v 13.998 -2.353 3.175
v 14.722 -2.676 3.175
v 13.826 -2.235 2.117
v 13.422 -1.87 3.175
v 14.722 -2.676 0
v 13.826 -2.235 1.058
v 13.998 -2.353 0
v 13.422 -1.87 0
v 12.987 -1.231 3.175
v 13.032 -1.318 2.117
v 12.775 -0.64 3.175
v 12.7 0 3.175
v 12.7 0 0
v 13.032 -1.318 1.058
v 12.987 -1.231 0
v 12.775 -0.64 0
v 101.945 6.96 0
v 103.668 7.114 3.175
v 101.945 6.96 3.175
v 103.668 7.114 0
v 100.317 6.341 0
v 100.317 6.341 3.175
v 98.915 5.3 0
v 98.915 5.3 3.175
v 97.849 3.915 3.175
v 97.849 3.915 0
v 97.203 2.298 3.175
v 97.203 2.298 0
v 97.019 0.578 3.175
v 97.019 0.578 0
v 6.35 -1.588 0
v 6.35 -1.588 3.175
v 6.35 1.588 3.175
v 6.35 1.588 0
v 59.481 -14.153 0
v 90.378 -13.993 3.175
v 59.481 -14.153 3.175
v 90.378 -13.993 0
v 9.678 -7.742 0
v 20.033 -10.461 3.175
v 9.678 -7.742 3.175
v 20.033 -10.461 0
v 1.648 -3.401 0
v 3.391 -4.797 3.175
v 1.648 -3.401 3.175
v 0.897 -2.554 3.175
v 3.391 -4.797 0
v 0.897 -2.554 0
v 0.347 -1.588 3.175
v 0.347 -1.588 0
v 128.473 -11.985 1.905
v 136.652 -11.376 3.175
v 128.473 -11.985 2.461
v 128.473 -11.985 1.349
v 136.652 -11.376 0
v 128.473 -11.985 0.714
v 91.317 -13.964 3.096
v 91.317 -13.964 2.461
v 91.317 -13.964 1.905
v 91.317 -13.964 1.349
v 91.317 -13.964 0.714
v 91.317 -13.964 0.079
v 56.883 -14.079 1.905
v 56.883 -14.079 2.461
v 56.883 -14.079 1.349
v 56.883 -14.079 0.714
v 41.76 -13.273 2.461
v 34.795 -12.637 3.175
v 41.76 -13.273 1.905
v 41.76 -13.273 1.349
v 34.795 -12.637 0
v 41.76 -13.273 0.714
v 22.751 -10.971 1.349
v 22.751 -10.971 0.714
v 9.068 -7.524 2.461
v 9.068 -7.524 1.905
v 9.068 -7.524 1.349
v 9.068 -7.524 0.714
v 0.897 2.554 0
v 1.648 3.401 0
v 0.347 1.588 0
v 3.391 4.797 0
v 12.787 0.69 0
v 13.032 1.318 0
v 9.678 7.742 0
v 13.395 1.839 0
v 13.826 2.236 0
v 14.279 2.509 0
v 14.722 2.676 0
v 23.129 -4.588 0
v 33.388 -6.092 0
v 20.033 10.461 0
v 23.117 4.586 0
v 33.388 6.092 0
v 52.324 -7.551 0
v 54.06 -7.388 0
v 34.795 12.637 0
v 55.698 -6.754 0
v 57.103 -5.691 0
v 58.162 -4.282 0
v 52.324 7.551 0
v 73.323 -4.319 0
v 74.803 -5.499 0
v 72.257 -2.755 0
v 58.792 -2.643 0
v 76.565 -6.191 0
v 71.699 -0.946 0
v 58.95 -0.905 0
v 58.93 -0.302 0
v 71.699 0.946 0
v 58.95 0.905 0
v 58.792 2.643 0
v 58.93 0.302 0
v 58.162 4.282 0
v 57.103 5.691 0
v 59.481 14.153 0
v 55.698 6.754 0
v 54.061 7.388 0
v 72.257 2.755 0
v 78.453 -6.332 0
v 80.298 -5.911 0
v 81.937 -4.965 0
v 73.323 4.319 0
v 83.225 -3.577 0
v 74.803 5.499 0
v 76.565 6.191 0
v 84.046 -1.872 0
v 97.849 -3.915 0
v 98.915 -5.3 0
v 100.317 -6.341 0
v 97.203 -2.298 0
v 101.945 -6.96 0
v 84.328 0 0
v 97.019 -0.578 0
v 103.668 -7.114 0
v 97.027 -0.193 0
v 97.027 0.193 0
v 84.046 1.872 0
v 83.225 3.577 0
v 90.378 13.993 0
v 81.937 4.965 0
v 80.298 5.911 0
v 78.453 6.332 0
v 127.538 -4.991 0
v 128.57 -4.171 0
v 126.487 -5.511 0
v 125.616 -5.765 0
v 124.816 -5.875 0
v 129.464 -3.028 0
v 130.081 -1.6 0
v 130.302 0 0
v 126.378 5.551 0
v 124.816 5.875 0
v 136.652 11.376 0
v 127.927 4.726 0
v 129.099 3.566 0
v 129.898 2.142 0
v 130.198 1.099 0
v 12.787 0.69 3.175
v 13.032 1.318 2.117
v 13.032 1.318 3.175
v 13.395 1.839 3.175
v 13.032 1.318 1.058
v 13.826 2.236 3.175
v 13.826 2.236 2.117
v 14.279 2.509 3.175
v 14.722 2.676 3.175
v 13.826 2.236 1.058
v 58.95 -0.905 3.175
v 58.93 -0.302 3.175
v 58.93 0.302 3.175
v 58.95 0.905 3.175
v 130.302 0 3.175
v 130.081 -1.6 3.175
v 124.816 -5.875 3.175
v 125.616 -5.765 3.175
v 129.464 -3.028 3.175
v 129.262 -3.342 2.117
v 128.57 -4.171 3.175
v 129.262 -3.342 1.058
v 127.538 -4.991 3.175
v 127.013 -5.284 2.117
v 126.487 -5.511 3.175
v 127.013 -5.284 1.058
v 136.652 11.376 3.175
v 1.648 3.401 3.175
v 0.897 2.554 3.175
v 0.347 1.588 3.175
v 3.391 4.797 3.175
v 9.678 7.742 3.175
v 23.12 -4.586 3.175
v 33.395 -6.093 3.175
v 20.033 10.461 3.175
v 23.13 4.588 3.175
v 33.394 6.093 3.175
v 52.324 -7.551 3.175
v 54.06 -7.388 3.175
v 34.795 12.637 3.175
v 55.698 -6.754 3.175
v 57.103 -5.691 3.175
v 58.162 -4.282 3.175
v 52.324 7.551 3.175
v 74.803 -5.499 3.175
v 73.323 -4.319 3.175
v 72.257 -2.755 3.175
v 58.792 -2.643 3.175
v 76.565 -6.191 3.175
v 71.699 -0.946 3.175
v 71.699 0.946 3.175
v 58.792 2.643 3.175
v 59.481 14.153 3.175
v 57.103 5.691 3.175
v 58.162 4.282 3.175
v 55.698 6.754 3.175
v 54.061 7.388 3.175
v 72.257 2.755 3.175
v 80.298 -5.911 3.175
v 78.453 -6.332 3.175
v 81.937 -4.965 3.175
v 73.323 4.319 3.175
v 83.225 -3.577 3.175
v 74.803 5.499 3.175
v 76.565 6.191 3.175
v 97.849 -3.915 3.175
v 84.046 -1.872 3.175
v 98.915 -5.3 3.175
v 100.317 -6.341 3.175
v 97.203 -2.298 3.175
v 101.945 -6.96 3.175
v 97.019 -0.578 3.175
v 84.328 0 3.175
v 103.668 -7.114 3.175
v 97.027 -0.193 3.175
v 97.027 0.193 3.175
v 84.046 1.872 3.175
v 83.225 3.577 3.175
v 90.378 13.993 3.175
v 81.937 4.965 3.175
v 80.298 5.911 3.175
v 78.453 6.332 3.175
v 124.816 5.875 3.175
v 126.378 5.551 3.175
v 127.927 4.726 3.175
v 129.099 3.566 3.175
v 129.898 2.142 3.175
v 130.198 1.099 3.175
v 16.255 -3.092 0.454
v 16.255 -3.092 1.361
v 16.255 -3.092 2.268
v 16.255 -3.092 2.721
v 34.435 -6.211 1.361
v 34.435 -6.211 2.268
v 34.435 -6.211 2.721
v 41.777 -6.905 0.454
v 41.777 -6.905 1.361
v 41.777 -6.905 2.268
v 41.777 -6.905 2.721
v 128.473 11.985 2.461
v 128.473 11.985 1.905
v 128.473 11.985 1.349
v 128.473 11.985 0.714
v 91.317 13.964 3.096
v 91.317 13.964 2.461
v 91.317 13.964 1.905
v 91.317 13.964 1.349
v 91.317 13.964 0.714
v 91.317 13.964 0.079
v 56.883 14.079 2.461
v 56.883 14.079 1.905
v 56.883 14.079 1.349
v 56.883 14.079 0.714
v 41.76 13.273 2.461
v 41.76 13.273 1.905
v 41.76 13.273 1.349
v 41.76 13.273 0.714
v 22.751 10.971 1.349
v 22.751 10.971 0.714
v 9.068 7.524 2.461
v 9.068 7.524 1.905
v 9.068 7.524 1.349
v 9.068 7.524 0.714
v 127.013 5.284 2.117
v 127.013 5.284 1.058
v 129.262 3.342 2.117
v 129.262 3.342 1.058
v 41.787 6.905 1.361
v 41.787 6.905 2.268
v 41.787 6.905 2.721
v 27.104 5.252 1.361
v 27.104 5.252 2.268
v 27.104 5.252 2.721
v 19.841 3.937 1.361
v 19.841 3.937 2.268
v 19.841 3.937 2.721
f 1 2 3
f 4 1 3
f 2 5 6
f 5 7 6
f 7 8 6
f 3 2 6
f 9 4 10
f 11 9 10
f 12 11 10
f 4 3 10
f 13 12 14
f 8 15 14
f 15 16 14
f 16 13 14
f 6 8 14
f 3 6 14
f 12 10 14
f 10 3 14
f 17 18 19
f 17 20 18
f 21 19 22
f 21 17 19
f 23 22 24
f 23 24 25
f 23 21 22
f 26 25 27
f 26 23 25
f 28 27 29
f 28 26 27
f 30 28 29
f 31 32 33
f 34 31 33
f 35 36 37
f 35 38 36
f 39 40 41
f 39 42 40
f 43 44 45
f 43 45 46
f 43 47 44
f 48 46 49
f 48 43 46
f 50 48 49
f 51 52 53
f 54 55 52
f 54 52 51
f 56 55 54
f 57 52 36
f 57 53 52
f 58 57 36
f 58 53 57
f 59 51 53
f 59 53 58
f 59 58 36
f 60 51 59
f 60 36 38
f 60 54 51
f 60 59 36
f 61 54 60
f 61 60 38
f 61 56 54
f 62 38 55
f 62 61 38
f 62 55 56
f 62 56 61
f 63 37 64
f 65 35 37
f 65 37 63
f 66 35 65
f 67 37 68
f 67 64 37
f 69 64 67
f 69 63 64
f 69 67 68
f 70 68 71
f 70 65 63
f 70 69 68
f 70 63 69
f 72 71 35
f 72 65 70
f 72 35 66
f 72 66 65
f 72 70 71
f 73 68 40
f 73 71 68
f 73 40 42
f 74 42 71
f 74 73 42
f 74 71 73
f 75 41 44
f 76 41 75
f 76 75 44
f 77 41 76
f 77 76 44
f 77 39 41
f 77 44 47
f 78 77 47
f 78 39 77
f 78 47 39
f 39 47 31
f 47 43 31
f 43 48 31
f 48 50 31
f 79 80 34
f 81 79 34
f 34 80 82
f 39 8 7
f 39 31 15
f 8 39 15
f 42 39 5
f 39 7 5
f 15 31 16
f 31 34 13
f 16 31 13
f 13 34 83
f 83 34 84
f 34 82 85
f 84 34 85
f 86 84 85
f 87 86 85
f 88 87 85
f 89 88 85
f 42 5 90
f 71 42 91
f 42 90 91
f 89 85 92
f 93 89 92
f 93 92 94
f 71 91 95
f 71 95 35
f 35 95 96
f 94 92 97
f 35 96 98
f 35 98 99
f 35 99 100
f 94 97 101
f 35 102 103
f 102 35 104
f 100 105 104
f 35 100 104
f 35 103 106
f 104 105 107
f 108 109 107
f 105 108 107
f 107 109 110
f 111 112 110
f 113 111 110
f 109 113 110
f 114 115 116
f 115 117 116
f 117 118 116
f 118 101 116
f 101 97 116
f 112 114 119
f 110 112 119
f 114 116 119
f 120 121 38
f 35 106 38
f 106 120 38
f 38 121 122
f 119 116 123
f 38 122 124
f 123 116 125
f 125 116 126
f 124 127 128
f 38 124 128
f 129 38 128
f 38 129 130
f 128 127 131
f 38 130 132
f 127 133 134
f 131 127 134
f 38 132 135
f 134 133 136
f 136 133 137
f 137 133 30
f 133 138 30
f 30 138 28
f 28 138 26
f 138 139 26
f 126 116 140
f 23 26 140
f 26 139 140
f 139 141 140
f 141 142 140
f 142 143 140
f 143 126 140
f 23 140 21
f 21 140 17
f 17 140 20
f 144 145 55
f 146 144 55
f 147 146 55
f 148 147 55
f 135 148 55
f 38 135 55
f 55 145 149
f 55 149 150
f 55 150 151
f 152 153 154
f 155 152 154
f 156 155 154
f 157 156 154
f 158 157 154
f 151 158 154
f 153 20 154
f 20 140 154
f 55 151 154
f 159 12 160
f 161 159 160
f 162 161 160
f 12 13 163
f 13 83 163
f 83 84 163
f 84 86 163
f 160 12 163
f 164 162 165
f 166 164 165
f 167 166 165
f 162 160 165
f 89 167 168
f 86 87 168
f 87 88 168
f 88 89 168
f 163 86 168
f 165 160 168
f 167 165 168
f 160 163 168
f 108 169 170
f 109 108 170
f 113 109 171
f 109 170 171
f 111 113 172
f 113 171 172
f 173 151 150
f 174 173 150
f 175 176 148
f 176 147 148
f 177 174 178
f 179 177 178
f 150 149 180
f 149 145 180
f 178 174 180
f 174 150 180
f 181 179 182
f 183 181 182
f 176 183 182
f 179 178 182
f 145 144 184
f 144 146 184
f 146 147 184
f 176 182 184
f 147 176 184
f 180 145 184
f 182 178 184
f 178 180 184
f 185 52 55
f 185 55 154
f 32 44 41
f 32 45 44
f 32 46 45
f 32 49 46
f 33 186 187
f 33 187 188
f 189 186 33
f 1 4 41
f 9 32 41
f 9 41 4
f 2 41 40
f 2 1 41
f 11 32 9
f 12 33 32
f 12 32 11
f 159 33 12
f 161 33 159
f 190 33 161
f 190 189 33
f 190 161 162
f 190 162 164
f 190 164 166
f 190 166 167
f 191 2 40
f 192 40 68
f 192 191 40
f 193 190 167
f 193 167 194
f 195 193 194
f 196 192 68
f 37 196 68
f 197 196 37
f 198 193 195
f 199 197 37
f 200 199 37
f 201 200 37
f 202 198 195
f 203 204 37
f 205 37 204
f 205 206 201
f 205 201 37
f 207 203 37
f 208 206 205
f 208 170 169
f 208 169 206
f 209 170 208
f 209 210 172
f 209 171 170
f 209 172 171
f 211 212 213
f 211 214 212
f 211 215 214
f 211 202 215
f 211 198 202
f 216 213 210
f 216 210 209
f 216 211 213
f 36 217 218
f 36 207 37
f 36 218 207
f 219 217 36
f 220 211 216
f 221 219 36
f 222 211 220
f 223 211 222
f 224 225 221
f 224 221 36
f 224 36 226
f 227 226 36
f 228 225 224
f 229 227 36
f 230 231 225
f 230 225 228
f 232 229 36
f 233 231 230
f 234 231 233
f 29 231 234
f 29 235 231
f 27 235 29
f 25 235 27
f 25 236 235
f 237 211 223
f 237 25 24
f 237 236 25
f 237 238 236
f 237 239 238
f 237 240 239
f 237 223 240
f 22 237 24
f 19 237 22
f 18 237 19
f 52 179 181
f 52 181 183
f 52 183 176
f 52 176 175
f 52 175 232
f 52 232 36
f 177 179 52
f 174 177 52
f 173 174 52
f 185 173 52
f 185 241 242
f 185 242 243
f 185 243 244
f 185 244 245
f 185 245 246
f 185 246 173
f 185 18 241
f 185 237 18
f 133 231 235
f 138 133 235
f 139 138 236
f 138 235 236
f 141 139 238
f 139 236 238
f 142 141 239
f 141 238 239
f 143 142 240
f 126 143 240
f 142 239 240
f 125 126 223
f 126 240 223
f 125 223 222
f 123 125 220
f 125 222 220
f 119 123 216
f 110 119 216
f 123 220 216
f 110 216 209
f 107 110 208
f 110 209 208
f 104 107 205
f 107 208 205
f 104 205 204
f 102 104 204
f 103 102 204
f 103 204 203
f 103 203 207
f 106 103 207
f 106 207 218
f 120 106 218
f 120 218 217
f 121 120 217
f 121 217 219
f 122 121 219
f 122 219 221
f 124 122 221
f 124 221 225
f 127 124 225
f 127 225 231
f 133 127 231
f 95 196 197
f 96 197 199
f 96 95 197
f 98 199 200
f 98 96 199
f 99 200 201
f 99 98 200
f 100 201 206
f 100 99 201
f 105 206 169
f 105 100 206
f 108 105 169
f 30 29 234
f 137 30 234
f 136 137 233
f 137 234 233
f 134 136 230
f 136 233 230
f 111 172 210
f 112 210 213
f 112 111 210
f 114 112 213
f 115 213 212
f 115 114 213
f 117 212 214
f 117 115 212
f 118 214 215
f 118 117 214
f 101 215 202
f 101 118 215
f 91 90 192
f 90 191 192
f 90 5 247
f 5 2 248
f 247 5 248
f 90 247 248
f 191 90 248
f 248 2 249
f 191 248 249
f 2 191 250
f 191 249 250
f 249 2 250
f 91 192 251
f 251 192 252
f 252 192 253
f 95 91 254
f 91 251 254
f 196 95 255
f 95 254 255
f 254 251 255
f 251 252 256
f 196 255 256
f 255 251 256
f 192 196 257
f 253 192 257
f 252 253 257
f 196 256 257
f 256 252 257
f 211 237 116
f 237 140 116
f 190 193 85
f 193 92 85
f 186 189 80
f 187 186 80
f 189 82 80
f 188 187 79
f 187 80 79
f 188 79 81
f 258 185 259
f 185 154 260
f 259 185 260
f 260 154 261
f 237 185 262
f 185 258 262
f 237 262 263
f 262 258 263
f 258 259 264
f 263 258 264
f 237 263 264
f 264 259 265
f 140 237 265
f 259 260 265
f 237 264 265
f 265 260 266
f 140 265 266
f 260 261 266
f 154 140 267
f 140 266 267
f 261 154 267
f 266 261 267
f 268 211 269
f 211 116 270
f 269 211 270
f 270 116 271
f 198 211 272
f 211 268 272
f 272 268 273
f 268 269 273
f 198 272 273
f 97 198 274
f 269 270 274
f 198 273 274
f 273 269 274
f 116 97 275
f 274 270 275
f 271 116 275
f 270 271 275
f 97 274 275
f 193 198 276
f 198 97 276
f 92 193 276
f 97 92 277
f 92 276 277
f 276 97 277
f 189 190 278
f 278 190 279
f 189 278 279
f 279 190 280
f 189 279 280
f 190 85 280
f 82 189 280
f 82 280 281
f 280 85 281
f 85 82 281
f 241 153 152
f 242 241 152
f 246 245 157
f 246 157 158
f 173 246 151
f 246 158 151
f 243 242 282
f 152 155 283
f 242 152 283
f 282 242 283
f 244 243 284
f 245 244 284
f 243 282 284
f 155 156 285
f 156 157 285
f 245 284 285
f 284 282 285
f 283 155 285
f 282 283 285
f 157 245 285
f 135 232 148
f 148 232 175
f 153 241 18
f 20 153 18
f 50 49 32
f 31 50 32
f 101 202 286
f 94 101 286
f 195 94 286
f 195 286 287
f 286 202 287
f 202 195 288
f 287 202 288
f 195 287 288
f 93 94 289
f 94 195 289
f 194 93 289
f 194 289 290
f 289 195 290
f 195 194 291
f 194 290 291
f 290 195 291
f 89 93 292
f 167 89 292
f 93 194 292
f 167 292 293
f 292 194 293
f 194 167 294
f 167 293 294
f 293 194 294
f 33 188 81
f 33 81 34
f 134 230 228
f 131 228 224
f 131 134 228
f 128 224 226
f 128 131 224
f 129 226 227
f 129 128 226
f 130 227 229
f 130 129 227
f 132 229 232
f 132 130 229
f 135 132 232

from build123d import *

# Parameters (mm, degrees)
BOSS_EXTRUDE1_DEPTH = 3.175
SKETCH3_R           = 6.35
SKETCH3_W           = 101.6
SKETCH3_H           = 101.6
SKETCH3_W_2         = 6.35
SKETCH3_H_2         = 3.175
CUT_EXTRUDE1_DEPTH  = 5.08
CUT_EXTRUDE2_DEPTH  = 5.08
FILLET1_R           = 6.35
FILLET2_DEPTH       = 3.175
FILLET3_DEPTH       = 3.175


with BuildPart() as part:
    # Sketch2 → Boss-Extrude1 (new body)
    with BuildSketch(Plane.XY):
        with BuildLine():
            add(Edge.make_bspline(
                [(238.252, 0), (238.137287952, 0.133045201), (237.77207605, 0.556624867), (236.492491596, 0.433381797), (234.746176517, 0.839991501), (232.179813549, 1.11930028), (228.961819586, 1.582109184), (225.049510149, 2.090865972), (220.490135834, 2.68626254), (215.303857957, 3.3424435), (209.525250222, 4.056068786), (203.189096271, 4.814866496), (196.334767874, 5.610240284), (189.004344512, 6.431112947), (181.243085157, 7.267536628), (173.098884015, 8.109100956), (164.621936298, 8.944949754), (155.864527368, 9.763348396), (146.880589413, 10.553553512), (137.725609535, 11.302354143), (128.455841103, 11.997541105), (119.128519532, 12.626207685), (109.801114172, 13.175209012), (100.531046651, 13.630675258), (91.37556861, 13.980460991), (82.390862495, 14.213154889), (73.632451948, 14.3173913), (65.154153809, 14.284897979), (57.008238889, 14.109398576), (49.244849388, 13.786444375), (41.91176916, 13.315190578), (35.054071993, 12.697055156), (28.713707328, 11.936865774), (22.929370487, 11.041090517), (17.735955293, 10.019084993), (13.164400922, 8.882405292), (9.239142537, 7.642135457), (5.984741248, 6.30982688), (3.398200889, 4.894493254), (1.521056143, 3.393341148), (0.248902593, 1.770054281), (0.079123223, 0.562679551), (0, 0)],
                knots=[0, 0, 0, 0, 0.002091853, 0.006659889, 0.014240034, 0.024784942, 0.038226646, 0.054481348, 0.073444809, 0.094998776, 0.11900639, 0.145318898, 0.173770288, 0.204183654, 0.236370679, 0.270129473, 0.305250351, 0.341516861, 0.378701149, 0.416575318, 0.454902219, 0.493447217, 0.531971459, 0.57023708, 0.608012632, 0.645066312, 0.681178002, 0.716129843, 0.74971807, 0.781748295, 0.812036536, 0.840415327, 0.866732056, 0.890849065, 0.912651845, 0.932046273, 0.94897292, 0.963413199, 0.975421325, 0.985175212, 0.993091122, 1, 1, 1, 1], degree=3))
            add(Edge.make_bspline(
                [(238.252, 0), (238.137287952, -0.133045201), (237.77207605, -0.556624867), (236.492491596, -0.433381797), (234.746176517, -0.839991501), (232.179813549, -1.11930028), (228.961819586, -1.582109184), (225.049510149, -2.090865972), (220.490135834, -2.68626254), (215.303857957, -3.3424435), (209.525250222, -4.056068786), (203.189096271, -4.814866496), (196.334767874, -5.610240284), (189.004344512, -6.431112947), (181.243085157, -7.267536628), (173.098884015, -8.109100956), (164.621936298, -8.944949754), (155.864527368, -9.763348396), (146.880589413, -10.553553512), (137.725609535, -11.302354143), (128.455841103, -11.997541105), (119.128519532, -12.626207685), (109.801114172, -13.175209012), (100.531046651, -13.630675258), (91.37556861, -13.980460991), (82.390862495, -14.213154889), (73.632451948, -14.3173913), (65.154153809, -14.284897979), (57.008238889, -14.109398576), (49.244849388, -13.786444375), (41.91176916, -13.315190578), (35.054071993, -12.697055156), (28.713707328, -11.936865774), (22.929370487, -11.041090517), (17.735955293, -10.019084993), (13.164400922, -8.882405292), (9.239142537, -7.642135457), (5.984741248, -6.30982688), (3.398200889, -4.894493254), (1.521056143, -3.393341148), (0.248902593, -1.770054281), (0.079123223, -0.562679551), (0, 0)],
                knots=[0, 0, 0, 0, 0.002091853, 0.006659889, 0.014240034, 0.024784942, 0.038226646, 0.054481348, 0.073444809, 0.094998776, 0.11900639, 0.145318898, 0.173770288, 0.204183654, 0.236370679, 0.270129473, 0.305250351, 0.341516861, 0.378701149, 0.416575318, 0.454902219, 0.493447217, 0.531971459, 0.57023708, 0.608012632, 0.645066312, 0.681178002, 0.716129843, 0.74971807, 0.781748295, 0.812036536, 0.840415327, 0.866732056, 0.890849065, 0.912651845, 0.932046273, 0.94897292, 0.963413199, 0.975421325, 0.985175212, 0.993091122, 1, 1, 1, 1], degree=3))
        make_face()
    extrude(amount=BOSS_EXTRUDE1_DEPTH)

    # Sketch3 → Cut-Extrude1 (cut)
    with BuildSketch(Plane.XY.offset(3.175)):
        with Locations((77.978, 0)):
            Circle(SKETCH3_R)
        with Locations((187.452, 0)):
            Rectangle(SKETCH3_W, SKETCH3_H)
        with Locations((3.175, 0)):
            Rectangle(SKETCH3_W_2, SKETCH3_H_2)
    extrude(amount=-CUT_EXTRUDE1_DEPTH, mode=Mode.SUBTRACT)

    # Sketch4 → Cut-Extrude2 (cut)
    with BuildSketch(Plane.XY.offset(3.175)):
        with BuildLine():
            Line((12.7, 2.061236545), (12.7, -2.061236545))
            add(Edge.make_bspline(
                [(12.7, -2.061236545), (13.87302955, -2.443877536), (15.059598103, -2.782274606), (17.45007242, -3.402412701), (18.654719046, -3.682875551), (22.272131196, -4.457000706), (24.694910319, -4.884570871), (29.554752497, -5.626532885), (31.991957197, -5.93980242), (36.877070752, -6.481527427), (39.324986389, -6.70992917), (46.681501726, -7.293964145), (51.604643093, -7.550220084), (57.888045432, -7.759101786), (59.249411697, -7.797222339), (60.610975339, -7.828726233)],
                knots=[0, 0, 0, 0, 0.03125, 0.03125, 0.0625, 0.0625, 0.125, 0.125, 0.1875, 0.1875, 0.25, 0.25, 0.375, 0.375, 0.409562817, 0.409562817, 0.409562817, 0.409562817], degree=3))
            ThreePointArc((60.610975339, -7.828726233), (58.928, -2.977e-06), (60.610972892, 7.828720805))
            add(Edge.make_bspline(
                [(60.610972892, 7.828720805), (59.248339009, 7.797194353), (57.886109917, 7.759046352), (51.605681243, 7.550222376), (46.692451729, 7.294644767), (39.334730429, 6.710796809), (36.884205555, 6.482297599), (31.98834866, 5.939423271), (29.540067539, 5.624629017), (24.668508937, 4.880199139), (22.245087233, 4.451720456), (18.638476615, 3.679142949), (17.440989968, 3.400141258), (15.059205889, 2.782087789), (13.874610371, 2.444393198), (12.7, 2.061236545)],
                knots=[0.590397153, 0.590397153, 0.590397153, 0.590397153, 0.625, 0.625, 0.75, 0.75, 0.8125, 0.8125, 0.875, 0.875, 0.9375, 0.9375, 0.96875, 0.96875, 1, 1, 1, 1], degree=3))
        make_face()
        with BuildLine():
            Line((130.302, -5.486095107), (130.302, 5.486095107))
            add(Edge.make_bspline(
                [(130.302, 5.486095107), (120.479608061, 6.203654851), (110.65279807, 6.808891522), (99.048125108, 7.323580363), (97.276696647, 7.396621304), (95.50503071, 7.463624756)],
                knots=[0, 0, 0, 0, 0.25, 0.25, 0.295030215, 0.295030215, 0.295030215, 0.295030215], degree=3))
            ThreePointArc((95.50503071, 7.463624756), (97.028, 8e-09), (95.505030716, -7.463624741))
            add(Edge.make_bspline(
                [(95.505030716, -7.463624741), (97.277633364, -7.3965859), (99.049998284, -7.323503172), (110.654669728, -6.808775817), (120.480543478, -6.203586515), (130.302, -5.486095107)],
                knots=[0.704941686, 0.704941686, 0.704941686, 0.704941686, 0.75, 0.75, 1, 1, 1, 1], degree=3))
        make_face()
    extrude(amount=-CUT_EXTRUDE2_DEPTH, mode=Mode.SUBTRACT)

    # Fillet1
    fillet1_edges = [part.edges().sort_by_distance(p)[0] for p in [
        (95.505030716, -7.463624741, 1.5875),
        (95.50503071, 7.463624756, 1.5875),
        (60.610975339, -7.828726233, 1.5875),
        (60.610972892, 7.828720805, 1.5875),
    ]]
    fillet(fillet1_edges, radius=FILLET1_R)

    # Fillet2: read off the stored shape, not the designer's step
    # Fillet2 outline → Fillet2 (add)
    with BuildSketch(Plane.XY):
        with BuildLine():
            add(Edge.make_bspline(
                [(12.7, -2.061236545), (13.369816068, -2.279729834), (14.044046619, -2.483797093), (14.721784869, -2.67640159)],
                knots=[0, 0, 0, 0, 0.017844181, 0.017844181, 0.017844181, 0.017844181], degree=3))
            add(Edge.make_bspline(
                [(14.721784869, -2.67640159), (13.589337149, -2.354574507), (12.699999989, -1.401222797), (12.7, 5.587e-06)],
                knots=[0, 0, 0, 0, 0.499999161, 0.499999161, 0.499999161, 0.499999161], degree=3, weights=[1, 0.757787173, 0.636680556, 0.63668015]))
            Line((12.7, 5.587e-06), (12.7, -2.061236545))
        make_face()
        with BuildLine():
            Line((12.7, 2.061236545), (12.7, 5.587e-06))
            add(Edge.make_bspline(
                [(12.7, 5.587e-06), (12.700000011, 1.401240459), (13.589344107, 2.354593836), (14.72179848, 2.676416587)],
                knots=[0.499999161, 0.499999161, 0.499999161, 0.499999161, 1, 1, 1, 1], degree=3, weights=[0.63668015, 0.636679744, 0.75778636, 1]))
            add(Edge.make_bspline(
                [(14.72179848, 2.676416587), (14.045066341, 2.484101731), (13.370904406, 2.280084849), (12.7, 2.061236545)],
                knots=[0.982150879, 0.982150879, 0.982150879, 0.982150879, 1, 1, 1, 1], degree=3))
        make_face()
    extrude(amount=FILLET2_DEPTH)

    # Fillet3: read off the stored shape, not the designer's step
    # Fillet3 outline → Fillet3 (add)
    with BuildSketch(Plane.XY):
        with BuildLine():
            add(Edge.make_bspline(
                [(130.302, 5.486095107), (128.473607675, 5.619665498), (126.645062264, 5.749343885), (124.816349362, 5.874764032)],
                knots=[0, 0, 0, 0, 0.046536331, 0.046536331, 0.046536331, 0.046536331], degree=3))
            add(Edge.make_bspline(
                [(124.816349362, 5.874764032), (127.6499069, 5.680427784), (130.302000005, 3.665691382), (130.302, 1e-08)],
                knots=[0, 0, 0, 0, 0.499999999, 0.499999999, 0.499999999, 0.499999999], degree=3, weights=[1, 0.689474367, 0.534211549, 0.534211549]))
            Line((130.302, 1e-08), (130.302, 5.486095107))
        make_face()
        with BuildLine():
            Line((130.302, -5.486095107), (130.302, 1e-08))
            add(Edge.make_bspline(
                [(130.302, 1e-08), (130.301999995, -3.665691389), (127.649906854, -5.680427785), (124.816349294, -5.874764)],
                knots=[0.499999999, 0.499999999, 0.499999999, 0.499999999, 1, 1, 1, 1], degree=3, weights=[0.534211549, 0.534211548, 0.689474365, 1]))
            add(Edge.make_bspline(
                [(124.816349294, -5.874764), (126.645062219, -5.749343873), (128.473607653, -5.619665499), (130.302, -5.486095107)],
                knots=[0.953459236, 0.953459236, 0.953459236, 0.953459236, 1, 1, 1, 1], degree=3))
        make_face()
    extrude(amount=FILLET3_DEPTH)


solid = part.part
